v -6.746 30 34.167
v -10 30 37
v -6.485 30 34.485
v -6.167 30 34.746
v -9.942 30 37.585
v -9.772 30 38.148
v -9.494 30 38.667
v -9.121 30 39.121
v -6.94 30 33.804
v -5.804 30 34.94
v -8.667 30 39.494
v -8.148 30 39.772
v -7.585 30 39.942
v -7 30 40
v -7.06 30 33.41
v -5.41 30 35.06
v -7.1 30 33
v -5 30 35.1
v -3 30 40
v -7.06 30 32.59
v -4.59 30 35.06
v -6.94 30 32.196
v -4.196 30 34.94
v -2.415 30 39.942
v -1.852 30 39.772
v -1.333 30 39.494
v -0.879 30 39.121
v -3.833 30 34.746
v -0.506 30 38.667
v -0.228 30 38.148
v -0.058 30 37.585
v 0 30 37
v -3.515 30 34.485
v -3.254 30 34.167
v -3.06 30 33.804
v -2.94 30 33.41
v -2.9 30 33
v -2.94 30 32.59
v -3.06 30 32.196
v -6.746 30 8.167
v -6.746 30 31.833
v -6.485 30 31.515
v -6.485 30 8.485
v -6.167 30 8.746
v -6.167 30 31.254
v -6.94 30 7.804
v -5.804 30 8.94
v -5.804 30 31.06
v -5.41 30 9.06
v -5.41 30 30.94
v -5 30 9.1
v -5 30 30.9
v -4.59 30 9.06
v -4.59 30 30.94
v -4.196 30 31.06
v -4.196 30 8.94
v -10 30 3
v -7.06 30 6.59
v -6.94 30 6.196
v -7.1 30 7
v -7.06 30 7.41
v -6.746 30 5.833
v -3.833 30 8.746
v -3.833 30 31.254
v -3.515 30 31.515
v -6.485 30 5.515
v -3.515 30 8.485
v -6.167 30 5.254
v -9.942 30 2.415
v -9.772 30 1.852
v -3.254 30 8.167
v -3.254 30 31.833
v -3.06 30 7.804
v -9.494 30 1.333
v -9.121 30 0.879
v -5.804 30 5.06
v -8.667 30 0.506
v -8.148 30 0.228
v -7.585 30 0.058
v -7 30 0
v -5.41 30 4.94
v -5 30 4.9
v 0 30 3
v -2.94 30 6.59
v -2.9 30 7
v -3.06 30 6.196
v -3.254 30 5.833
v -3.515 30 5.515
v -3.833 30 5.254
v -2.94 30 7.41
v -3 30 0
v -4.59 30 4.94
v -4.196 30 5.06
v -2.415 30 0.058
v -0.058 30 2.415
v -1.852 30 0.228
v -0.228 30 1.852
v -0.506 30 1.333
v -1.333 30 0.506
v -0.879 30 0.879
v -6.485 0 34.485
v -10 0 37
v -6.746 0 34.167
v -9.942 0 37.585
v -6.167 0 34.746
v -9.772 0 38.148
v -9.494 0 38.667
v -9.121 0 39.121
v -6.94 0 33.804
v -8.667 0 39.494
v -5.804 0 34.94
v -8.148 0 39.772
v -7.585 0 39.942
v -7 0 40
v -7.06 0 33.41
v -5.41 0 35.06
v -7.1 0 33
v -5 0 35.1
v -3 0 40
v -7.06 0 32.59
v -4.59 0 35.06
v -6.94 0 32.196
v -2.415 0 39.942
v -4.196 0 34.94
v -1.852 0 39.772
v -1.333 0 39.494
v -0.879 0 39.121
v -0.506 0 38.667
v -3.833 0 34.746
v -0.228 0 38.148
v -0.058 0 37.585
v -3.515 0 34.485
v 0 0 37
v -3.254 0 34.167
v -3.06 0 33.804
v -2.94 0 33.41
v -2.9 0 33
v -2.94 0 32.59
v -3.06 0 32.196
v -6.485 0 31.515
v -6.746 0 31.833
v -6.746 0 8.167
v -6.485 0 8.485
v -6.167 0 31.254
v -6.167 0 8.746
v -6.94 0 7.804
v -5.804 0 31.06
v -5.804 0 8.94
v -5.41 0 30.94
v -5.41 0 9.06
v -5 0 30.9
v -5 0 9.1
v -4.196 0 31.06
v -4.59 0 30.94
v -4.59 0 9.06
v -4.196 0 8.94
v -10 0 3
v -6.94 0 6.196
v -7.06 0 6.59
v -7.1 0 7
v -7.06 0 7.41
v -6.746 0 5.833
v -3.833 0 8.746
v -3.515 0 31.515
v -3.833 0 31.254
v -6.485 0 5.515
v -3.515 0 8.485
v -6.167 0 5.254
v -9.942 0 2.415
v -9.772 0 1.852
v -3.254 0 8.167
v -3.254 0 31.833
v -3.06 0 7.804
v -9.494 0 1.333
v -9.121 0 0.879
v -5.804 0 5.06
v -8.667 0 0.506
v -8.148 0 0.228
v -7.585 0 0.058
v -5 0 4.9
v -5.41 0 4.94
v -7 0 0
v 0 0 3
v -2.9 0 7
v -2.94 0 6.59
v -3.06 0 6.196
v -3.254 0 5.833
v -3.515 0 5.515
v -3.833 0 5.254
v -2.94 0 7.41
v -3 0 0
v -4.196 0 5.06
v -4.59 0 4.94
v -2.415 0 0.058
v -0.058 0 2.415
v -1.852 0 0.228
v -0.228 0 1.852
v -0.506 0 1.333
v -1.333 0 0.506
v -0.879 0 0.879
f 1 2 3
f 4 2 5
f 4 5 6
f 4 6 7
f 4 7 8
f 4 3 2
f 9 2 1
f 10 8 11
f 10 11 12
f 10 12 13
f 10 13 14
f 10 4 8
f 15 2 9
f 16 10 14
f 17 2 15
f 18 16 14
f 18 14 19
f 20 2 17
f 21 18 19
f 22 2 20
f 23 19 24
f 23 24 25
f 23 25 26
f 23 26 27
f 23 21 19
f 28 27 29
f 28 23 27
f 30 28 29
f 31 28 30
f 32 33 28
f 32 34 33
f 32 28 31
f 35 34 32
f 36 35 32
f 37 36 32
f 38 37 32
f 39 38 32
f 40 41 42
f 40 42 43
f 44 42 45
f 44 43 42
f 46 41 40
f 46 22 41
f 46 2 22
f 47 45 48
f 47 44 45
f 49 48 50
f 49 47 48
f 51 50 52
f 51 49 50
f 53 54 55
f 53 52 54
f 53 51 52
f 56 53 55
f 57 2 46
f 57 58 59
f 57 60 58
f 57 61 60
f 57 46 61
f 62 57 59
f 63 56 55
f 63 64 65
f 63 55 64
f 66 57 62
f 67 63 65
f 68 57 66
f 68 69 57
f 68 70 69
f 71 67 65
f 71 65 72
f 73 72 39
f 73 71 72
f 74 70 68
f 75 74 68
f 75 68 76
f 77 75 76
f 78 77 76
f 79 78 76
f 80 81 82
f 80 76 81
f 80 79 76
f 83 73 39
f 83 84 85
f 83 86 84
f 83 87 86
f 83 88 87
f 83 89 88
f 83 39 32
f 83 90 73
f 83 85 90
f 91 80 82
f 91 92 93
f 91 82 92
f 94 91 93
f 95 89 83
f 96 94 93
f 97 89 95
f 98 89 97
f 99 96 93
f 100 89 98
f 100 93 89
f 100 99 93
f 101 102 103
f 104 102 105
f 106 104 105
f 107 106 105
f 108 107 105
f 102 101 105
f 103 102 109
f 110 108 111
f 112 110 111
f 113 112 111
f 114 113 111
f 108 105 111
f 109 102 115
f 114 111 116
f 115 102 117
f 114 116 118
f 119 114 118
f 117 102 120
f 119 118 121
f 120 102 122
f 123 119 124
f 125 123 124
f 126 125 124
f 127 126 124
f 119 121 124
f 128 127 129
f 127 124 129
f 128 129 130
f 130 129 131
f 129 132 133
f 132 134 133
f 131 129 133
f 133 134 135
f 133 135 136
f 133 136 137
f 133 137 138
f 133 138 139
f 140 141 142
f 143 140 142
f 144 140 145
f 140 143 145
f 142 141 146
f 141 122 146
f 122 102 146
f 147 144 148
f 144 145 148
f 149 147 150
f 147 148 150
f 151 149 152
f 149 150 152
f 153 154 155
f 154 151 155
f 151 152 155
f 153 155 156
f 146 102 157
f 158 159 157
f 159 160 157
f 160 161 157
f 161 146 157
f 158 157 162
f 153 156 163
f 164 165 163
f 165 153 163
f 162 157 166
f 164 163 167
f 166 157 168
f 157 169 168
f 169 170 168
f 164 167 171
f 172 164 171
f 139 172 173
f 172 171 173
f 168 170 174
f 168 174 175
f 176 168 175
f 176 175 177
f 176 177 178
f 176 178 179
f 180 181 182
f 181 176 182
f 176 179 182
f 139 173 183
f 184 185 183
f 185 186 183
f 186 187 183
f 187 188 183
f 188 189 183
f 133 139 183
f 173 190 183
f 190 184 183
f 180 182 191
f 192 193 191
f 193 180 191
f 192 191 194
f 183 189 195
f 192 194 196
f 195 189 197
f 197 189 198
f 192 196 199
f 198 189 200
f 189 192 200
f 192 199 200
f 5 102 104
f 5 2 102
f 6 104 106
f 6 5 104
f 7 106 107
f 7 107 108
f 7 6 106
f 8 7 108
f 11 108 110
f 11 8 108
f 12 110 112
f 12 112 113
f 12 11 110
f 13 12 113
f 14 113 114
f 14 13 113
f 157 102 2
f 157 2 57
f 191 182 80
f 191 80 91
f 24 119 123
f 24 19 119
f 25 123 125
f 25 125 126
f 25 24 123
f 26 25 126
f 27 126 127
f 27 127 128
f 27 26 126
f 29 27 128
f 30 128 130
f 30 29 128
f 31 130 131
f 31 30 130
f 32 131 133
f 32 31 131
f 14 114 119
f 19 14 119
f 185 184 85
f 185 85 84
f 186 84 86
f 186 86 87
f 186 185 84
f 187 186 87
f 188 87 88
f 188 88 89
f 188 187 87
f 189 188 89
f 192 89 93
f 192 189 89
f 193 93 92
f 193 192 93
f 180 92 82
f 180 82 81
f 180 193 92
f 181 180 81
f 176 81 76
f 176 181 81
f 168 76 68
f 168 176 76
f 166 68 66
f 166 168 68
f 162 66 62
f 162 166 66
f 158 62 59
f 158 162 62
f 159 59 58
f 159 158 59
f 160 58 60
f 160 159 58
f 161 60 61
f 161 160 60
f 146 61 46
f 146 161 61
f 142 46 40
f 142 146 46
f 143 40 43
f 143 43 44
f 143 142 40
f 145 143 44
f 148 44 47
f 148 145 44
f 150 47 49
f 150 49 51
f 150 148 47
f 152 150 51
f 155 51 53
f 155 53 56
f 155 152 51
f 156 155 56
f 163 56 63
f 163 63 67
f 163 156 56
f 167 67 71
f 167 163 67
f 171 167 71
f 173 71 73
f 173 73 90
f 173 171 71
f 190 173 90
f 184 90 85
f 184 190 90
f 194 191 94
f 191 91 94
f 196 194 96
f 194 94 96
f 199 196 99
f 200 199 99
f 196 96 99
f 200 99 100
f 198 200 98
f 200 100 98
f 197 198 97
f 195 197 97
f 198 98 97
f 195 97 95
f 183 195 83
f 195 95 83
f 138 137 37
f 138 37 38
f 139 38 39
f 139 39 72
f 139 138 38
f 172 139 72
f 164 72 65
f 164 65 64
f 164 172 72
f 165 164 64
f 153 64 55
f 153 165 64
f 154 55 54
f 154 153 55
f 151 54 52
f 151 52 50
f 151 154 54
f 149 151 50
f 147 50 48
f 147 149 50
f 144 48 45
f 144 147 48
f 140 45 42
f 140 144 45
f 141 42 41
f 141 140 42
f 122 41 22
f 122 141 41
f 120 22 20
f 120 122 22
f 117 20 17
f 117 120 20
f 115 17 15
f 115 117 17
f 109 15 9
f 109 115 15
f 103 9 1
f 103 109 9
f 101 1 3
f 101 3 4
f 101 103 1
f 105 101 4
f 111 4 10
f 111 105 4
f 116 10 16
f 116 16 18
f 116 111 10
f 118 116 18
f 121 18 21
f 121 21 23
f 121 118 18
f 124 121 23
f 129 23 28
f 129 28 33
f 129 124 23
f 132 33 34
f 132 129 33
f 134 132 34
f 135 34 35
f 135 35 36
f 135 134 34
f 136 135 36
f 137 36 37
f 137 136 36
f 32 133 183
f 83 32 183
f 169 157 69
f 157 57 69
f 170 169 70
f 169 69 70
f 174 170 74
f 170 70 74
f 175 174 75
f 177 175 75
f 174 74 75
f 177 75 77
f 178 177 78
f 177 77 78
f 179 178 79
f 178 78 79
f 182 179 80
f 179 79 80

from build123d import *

# Parameters (mm, degrees)
SKETCH_1_W      = 10
SKETCH_1_H      = 40
SKETCH_1_R      = 2.1
EXTRUDE_1_DEPTH = 30
FILLET_1_R      = 3


with BuildPart() as part:
    # 草图1 → 凸台-拉伸1 (new body)
    with BuildSketch(Plane(origin=(0, 0, 0), x_dir=(1, 0, 0), z_dir=(0, 1, 0))):
        with Locations((-5, -20)):
            Rectangle(SKETCH_1_W, SKETCH_1_H)
        with Locations((-5, -7)):
            Circle(SKETCH_1_R, mode=Mode.SUBTRACT)
        with Locations((-5, -33)):
            Circle(SKETCH_1_R, mode=Mode.SUBTRACT)
    extrude(amount=EXTRUDE_1_DEPTH)

    # 圆角1
    fillet_1_edges = [part.edges().sort_by_distance(p)[0] for p in [
        (-10, 15, 0),
        (0, 15, 0),
        (0, 15, 40),
        (-10, 15, 40),
    ]]
    fillet(fillet_1_edges, radius=FILLET_1_R)


solid = part.part
